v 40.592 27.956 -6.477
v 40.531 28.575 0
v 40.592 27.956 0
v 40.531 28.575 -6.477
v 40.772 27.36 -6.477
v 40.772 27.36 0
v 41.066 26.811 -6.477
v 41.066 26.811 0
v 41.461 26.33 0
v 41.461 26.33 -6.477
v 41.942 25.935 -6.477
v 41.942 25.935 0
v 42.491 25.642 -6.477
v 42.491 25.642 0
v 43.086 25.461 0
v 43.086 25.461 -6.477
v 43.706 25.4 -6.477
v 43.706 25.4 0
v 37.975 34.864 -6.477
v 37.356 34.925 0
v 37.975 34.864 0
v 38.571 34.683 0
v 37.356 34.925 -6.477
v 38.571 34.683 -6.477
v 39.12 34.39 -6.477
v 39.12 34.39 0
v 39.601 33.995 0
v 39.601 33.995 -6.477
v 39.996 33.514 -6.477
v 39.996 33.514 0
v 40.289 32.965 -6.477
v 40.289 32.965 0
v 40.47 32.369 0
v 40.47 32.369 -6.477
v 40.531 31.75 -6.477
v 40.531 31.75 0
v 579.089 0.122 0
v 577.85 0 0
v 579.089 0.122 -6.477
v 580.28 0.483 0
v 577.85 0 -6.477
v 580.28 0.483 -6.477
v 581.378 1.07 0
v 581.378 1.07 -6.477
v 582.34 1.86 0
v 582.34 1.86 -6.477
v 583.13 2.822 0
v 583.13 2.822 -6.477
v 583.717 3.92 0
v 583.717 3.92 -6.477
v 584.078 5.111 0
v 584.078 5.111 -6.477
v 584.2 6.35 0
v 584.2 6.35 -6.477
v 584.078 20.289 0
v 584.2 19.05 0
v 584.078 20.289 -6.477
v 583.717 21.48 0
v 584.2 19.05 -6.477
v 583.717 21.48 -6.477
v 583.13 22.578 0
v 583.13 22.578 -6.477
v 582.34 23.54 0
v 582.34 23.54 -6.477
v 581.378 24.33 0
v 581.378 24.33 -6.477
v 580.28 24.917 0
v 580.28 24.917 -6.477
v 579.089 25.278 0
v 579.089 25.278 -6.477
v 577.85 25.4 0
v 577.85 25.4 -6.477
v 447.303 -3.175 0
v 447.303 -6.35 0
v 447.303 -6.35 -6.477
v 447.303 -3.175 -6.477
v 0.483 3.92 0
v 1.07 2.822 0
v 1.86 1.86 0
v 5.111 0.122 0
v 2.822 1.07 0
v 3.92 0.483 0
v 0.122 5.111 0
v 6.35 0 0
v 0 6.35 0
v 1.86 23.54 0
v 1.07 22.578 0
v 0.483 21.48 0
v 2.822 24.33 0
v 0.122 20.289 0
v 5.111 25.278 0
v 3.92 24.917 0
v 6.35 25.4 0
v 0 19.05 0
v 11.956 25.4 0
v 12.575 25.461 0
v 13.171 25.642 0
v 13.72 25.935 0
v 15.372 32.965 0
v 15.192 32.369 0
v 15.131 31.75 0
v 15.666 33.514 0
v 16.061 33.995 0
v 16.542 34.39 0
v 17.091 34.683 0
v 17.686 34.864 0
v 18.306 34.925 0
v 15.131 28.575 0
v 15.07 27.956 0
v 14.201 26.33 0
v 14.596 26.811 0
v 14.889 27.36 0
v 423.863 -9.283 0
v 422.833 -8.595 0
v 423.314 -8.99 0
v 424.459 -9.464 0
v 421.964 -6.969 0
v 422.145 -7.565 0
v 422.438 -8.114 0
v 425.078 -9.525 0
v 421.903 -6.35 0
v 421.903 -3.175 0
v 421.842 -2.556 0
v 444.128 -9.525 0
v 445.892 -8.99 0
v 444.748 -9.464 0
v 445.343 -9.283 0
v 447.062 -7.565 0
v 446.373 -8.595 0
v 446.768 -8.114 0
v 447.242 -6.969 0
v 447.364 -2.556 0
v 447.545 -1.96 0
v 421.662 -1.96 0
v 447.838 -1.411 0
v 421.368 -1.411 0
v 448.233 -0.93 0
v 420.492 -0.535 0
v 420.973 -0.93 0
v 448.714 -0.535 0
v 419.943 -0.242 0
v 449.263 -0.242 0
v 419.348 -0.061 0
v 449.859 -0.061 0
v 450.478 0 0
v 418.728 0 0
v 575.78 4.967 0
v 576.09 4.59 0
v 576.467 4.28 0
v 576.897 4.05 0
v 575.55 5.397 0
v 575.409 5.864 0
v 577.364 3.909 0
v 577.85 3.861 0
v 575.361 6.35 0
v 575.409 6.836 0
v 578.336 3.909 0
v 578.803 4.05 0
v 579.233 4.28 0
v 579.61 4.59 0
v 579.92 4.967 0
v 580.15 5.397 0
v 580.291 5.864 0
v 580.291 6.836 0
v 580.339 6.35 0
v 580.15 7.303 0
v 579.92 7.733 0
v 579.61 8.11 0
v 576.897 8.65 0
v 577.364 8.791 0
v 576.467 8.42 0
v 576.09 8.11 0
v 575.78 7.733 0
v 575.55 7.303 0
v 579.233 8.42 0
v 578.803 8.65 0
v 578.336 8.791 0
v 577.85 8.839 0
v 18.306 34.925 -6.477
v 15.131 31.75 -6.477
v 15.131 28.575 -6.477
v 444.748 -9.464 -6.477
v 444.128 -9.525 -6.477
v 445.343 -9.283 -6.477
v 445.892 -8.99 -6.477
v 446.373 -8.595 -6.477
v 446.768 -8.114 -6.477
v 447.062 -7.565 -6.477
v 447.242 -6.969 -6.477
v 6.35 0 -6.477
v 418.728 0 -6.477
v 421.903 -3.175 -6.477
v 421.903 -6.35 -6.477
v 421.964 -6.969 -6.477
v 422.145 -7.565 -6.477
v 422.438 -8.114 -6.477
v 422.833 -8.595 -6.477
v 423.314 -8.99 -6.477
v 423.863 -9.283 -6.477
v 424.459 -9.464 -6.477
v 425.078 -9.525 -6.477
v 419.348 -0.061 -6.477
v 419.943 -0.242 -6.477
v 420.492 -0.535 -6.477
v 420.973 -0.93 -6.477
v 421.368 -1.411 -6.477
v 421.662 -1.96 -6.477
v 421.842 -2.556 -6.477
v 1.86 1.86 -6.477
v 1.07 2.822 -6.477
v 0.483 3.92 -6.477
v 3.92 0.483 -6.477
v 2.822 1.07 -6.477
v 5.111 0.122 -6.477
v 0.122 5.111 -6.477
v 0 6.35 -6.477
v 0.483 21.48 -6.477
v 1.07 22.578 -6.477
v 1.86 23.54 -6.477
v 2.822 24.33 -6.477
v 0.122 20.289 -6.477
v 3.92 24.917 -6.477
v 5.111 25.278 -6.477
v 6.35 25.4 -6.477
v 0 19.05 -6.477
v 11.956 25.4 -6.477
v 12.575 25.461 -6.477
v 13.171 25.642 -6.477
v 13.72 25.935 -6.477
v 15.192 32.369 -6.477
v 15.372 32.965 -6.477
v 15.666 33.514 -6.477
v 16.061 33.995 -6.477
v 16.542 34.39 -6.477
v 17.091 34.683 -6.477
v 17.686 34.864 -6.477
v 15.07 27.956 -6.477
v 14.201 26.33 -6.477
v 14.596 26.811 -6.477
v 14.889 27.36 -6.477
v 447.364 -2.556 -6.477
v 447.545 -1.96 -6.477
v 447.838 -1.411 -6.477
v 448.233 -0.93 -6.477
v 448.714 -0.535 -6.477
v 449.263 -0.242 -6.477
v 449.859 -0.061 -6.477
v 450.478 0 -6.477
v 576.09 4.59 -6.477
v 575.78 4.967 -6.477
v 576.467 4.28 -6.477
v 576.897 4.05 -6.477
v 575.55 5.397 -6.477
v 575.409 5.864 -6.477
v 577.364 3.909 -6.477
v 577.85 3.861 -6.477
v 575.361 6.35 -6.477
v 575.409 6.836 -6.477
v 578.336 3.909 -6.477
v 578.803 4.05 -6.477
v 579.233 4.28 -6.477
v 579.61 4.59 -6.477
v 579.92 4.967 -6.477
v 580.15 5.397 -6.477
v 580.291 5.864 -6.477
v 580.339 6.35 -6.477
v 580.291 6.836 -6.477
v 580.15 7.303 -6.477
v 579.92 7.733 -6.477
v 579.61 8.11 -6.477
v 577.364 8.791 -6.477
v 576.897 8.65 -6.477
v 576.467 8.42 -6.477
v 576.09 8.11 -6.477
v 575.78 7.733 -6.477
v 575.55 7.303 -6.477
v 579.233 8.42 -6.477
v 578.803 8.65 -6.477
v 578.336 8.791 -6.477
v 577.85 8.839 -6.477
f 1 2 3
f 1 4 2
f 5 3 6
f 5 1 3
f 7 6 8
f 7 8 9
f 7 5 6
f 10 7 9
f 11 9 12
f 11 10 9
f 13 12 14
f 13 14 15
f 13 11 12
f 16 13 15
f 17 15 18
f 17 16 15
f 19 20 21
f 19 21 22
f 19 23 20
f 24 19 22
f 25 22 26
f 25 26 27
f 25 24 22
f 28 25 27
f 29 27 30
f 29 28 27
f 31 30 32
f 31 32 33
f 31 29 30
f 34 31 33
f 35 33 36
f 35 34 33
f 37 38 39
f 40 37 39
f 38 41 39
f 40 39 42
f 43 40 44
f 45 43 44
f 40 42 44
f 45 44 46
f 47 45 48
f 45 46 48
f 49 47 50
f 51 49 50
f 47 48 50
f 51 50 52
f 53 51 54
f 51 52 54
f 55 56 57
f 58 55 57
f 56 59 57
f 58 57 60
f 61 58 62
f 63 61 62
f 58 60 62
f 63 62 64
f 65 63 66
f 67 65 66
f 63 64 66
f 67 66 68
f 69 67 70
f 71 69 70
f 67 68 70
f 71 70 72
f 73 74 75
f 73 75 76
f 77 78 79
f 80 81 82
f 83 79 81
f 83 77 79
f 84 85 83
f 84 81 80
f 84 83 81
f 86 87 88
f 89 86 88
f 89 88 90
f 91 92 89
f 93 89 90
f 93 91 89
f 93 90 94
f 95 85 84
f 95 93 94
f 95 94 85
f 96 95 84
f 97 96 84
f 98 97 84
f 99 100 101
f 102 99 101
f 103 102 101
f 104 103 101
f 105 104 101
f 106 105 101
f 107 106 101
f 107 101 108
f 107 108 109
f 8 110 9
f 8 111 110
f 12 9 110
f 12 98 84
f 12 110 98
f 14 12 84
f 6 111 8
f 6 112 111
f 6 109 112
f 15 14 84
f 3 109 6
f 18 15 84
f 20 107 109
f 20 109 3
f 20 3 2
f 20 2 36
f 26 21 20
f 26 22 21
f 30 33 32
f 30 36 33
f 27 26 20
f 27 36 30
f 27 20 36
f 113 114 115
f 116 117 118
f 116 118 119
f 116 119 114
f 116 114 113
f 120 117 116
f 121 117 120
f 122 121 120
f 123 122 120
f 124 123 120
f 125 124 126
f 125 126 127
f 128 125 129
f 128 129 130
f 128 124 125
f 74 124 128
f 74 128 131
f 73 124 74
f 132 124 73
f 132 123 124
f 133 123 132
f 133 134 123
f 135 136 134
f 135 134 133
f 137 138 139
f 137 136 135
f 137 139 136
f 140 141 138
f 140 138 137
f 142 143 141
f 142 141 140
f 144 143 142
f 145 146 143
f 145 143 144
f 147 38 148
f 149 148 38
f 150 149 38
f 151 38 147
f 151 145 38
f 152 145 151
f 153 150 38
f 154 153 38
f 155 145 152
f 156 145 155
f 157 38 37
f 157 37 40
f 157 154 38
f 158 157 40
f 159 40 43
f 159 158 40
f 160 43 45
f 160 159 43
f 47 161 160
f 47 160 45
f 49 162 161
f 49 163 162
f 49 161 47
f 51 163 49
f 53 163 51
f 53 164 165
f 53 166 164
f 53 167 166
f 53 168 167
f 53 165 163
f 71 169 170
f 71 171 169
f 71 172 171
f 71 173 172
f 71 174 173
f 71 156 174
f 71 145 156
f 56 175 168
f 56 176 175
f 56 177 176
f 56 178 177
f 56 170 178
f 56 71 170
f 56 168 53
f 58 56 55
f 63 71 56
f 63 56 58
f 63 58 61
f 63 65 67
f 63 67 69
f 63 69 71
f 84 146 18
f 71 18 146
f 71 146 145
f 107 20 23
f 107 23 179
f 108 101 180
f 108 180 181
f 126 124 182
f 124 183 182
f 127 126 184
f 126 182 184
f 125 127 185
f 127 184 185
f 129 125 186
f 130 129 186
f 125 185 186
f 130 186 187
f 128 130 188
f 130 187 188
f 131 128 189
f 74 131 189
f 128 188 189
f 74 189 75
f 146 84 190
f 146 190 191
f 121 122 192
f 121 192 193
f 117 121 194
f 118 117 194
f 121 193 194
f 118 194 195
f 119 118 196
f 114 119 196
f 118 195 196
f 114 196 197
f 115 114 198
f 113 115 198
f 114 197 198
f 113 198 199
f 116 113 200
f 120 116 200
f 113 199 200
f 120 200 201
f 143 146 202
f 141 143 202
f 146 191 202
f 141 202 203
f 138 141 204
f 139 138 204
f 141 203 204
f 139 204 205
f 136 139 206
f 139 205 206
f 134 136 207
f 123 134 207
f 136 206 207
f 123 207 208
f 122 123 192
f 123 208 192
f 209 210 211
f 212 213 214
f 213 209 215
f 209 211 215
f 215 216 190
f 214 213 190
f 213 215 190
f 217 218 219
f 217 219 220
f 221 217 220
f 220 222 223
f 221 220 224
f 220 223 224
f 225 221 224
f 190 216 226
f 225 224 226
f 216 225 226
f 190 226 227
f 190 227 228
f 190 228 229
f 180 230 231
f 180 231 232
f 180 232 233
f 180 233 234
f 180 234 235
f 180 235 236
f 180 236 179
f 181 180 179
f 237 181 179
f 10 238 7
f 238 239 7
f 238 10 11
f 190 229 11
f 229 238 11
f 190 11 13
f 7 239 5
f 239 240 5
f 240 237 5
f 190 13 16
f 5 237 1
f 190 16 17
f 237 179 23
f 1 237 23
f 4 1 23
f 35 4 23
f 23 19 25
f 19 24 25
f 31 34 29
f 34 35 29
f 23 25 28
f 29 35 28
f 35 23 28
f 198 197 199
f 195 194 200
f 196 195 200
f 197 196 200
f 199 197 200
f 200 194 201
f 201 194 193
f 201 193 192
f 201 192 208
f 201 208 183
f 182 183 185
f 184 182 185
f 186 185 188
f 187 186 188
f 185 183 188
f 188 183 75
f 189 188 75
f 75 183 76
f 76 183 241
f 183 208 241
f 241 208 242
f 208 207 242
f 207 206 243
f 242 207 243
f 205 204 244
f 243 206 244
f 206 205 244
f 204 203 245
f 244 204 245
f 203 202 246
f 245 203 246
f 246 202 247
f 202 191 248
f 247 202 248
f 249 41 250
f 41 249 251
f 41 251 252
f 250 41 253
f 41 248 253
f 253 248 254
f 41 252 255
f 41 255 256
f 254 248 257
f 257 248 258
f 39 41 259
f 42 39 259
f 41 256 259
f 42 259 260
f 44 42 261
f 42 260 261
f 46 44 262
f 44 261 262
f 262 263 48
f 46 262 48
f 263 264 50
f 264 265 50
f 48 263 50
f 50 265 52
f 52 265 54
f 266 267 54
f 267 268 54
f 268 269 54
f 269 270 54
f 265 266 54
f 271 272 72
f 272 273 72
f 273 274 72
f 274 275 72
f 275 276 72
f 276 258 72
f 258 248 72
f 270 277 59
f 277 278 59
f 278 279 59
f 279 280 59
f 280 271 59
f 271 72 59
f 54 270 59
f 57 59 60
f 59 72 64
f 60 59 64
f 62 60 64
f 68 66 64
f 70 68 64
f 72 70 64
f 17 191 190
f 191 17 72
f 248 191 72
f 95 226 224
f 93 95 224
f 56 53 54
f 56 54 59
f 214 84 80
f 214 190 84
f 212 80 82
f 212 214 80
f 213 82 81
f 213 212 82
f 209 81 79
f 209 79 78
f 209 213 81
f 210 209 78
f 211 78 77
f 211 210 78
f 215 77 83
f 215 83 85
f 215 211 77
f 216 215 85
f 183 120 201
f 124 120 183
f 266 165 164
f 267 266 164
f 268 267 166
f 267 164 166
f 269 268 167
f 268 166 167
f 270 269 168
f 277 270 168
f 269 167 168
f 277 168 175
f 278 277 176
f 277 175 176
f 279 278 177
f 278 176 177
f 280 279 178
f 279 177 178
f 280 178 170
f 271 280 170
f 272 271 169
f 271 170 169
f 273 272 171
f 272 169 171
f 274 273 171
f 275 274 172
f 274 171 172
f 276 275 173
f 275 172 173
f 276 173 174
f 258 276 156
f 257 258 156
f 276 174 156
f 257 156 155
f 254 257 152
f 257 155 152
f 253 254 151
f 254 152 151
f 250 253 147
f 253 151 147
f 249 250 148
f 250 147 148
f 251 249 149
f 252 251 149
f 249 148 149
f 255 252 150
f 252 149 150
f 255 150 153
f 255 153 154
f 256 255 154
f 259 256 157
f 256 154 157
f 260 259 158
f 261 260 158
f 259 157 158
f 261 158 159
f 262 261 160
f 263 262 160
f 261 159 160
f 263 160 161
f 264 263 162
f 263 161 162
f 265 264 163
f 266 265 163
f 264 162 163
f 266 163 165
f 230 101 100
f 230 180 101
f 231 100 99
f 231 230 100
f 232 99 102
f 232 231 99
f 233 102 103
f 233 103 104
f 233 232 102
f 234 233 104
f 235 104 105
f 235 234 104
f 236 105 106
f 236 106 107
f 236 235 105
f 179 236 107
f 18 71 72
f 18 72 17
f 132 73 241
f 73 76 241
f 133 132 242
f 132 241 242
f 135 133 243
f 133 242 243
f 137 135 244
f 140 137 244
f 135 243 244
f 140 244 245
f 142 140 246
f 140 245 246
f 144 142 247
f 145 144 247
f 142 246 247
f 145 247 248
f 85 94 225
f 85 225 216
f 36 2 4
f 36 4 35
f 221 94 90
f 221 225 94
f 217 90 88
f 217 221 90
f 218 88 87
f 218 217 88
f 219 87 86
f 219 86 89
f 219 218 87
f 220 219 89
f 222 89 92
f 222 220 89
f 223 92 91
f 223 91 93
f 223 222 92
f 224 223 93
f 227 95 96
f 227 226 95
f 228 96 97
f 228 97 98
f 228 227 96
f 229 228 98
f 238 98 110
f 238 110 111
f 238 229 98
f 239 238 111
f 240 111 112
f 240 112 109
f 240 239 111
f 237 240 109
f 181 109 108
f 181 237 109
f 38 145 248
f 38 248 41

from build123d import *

# Parameters (mm, degrees)
SKETCH1_R           = 2.4892
BOSS_EXTRUDE1_DEPTH = 6.477
FILLET2_R           = 6.35
FILLET3_R           = 3.175


with BuildPart() as part:
    # Sketch1 → Boss-Extrude1 (new body)
    with BuildSketch(Plane.XY):
        Polygon((0, 0), (40.53078, 0), (421.903292844, 0), (421.903292844, -9.525), (447.303292844, -9.525), (447.303292844, 0), (584.2, 0), (584.2, 25.4), (40.530665192, 25.4), (40.530665192, 34.925), (15.130665192, 34.925), (15.130665192, 25.4), (0, 25.4), align=None)
        with Locations((577.85, 6.35)):
            Circle(SKETCH1_R, mode=Mode.SUBTRACT)
    extrude(amount=BOSS_EXTRUDE1_DEPTH)

    # Fillet2
    fillet2_edges = [part.edges().sort_by_distance(p)[0] for p in [
        (0, 0, 3.2385),
        (0, 25.4, 3.2385),
        (584.2, 25.4, 3.2385),
        (584.2, 0, 3.2385),
    ]]
    fillet(fillet2_edges, radius=FILLET2_R)


with BuildPart() as body_2:
    # Mirror2: mirrored copy
    add(part.part.mirror(Plane.XY))

    # Fillet3
    fillet3_edges = [body_2.edges().sort_by_distance(p)[0] for p in [
        (447.303292844, -9.525, -3.2385),
        (421.903292844, -9.525, -3.2385),
        (421.903292844, 0, -3.2385),
        (15.130665192, 25.4, -3.2385),
        (15.130665192, 34.925, -3.2385),
        (40.530665192, 34.925, -3.2385),
        (40.530665192, 25.4, -3.2385),
        (447.303292844, 0, -3.2385),
    ]]
    fillet(fillet3_edges, radius=FILLET3_R)


solid = body_2.part
